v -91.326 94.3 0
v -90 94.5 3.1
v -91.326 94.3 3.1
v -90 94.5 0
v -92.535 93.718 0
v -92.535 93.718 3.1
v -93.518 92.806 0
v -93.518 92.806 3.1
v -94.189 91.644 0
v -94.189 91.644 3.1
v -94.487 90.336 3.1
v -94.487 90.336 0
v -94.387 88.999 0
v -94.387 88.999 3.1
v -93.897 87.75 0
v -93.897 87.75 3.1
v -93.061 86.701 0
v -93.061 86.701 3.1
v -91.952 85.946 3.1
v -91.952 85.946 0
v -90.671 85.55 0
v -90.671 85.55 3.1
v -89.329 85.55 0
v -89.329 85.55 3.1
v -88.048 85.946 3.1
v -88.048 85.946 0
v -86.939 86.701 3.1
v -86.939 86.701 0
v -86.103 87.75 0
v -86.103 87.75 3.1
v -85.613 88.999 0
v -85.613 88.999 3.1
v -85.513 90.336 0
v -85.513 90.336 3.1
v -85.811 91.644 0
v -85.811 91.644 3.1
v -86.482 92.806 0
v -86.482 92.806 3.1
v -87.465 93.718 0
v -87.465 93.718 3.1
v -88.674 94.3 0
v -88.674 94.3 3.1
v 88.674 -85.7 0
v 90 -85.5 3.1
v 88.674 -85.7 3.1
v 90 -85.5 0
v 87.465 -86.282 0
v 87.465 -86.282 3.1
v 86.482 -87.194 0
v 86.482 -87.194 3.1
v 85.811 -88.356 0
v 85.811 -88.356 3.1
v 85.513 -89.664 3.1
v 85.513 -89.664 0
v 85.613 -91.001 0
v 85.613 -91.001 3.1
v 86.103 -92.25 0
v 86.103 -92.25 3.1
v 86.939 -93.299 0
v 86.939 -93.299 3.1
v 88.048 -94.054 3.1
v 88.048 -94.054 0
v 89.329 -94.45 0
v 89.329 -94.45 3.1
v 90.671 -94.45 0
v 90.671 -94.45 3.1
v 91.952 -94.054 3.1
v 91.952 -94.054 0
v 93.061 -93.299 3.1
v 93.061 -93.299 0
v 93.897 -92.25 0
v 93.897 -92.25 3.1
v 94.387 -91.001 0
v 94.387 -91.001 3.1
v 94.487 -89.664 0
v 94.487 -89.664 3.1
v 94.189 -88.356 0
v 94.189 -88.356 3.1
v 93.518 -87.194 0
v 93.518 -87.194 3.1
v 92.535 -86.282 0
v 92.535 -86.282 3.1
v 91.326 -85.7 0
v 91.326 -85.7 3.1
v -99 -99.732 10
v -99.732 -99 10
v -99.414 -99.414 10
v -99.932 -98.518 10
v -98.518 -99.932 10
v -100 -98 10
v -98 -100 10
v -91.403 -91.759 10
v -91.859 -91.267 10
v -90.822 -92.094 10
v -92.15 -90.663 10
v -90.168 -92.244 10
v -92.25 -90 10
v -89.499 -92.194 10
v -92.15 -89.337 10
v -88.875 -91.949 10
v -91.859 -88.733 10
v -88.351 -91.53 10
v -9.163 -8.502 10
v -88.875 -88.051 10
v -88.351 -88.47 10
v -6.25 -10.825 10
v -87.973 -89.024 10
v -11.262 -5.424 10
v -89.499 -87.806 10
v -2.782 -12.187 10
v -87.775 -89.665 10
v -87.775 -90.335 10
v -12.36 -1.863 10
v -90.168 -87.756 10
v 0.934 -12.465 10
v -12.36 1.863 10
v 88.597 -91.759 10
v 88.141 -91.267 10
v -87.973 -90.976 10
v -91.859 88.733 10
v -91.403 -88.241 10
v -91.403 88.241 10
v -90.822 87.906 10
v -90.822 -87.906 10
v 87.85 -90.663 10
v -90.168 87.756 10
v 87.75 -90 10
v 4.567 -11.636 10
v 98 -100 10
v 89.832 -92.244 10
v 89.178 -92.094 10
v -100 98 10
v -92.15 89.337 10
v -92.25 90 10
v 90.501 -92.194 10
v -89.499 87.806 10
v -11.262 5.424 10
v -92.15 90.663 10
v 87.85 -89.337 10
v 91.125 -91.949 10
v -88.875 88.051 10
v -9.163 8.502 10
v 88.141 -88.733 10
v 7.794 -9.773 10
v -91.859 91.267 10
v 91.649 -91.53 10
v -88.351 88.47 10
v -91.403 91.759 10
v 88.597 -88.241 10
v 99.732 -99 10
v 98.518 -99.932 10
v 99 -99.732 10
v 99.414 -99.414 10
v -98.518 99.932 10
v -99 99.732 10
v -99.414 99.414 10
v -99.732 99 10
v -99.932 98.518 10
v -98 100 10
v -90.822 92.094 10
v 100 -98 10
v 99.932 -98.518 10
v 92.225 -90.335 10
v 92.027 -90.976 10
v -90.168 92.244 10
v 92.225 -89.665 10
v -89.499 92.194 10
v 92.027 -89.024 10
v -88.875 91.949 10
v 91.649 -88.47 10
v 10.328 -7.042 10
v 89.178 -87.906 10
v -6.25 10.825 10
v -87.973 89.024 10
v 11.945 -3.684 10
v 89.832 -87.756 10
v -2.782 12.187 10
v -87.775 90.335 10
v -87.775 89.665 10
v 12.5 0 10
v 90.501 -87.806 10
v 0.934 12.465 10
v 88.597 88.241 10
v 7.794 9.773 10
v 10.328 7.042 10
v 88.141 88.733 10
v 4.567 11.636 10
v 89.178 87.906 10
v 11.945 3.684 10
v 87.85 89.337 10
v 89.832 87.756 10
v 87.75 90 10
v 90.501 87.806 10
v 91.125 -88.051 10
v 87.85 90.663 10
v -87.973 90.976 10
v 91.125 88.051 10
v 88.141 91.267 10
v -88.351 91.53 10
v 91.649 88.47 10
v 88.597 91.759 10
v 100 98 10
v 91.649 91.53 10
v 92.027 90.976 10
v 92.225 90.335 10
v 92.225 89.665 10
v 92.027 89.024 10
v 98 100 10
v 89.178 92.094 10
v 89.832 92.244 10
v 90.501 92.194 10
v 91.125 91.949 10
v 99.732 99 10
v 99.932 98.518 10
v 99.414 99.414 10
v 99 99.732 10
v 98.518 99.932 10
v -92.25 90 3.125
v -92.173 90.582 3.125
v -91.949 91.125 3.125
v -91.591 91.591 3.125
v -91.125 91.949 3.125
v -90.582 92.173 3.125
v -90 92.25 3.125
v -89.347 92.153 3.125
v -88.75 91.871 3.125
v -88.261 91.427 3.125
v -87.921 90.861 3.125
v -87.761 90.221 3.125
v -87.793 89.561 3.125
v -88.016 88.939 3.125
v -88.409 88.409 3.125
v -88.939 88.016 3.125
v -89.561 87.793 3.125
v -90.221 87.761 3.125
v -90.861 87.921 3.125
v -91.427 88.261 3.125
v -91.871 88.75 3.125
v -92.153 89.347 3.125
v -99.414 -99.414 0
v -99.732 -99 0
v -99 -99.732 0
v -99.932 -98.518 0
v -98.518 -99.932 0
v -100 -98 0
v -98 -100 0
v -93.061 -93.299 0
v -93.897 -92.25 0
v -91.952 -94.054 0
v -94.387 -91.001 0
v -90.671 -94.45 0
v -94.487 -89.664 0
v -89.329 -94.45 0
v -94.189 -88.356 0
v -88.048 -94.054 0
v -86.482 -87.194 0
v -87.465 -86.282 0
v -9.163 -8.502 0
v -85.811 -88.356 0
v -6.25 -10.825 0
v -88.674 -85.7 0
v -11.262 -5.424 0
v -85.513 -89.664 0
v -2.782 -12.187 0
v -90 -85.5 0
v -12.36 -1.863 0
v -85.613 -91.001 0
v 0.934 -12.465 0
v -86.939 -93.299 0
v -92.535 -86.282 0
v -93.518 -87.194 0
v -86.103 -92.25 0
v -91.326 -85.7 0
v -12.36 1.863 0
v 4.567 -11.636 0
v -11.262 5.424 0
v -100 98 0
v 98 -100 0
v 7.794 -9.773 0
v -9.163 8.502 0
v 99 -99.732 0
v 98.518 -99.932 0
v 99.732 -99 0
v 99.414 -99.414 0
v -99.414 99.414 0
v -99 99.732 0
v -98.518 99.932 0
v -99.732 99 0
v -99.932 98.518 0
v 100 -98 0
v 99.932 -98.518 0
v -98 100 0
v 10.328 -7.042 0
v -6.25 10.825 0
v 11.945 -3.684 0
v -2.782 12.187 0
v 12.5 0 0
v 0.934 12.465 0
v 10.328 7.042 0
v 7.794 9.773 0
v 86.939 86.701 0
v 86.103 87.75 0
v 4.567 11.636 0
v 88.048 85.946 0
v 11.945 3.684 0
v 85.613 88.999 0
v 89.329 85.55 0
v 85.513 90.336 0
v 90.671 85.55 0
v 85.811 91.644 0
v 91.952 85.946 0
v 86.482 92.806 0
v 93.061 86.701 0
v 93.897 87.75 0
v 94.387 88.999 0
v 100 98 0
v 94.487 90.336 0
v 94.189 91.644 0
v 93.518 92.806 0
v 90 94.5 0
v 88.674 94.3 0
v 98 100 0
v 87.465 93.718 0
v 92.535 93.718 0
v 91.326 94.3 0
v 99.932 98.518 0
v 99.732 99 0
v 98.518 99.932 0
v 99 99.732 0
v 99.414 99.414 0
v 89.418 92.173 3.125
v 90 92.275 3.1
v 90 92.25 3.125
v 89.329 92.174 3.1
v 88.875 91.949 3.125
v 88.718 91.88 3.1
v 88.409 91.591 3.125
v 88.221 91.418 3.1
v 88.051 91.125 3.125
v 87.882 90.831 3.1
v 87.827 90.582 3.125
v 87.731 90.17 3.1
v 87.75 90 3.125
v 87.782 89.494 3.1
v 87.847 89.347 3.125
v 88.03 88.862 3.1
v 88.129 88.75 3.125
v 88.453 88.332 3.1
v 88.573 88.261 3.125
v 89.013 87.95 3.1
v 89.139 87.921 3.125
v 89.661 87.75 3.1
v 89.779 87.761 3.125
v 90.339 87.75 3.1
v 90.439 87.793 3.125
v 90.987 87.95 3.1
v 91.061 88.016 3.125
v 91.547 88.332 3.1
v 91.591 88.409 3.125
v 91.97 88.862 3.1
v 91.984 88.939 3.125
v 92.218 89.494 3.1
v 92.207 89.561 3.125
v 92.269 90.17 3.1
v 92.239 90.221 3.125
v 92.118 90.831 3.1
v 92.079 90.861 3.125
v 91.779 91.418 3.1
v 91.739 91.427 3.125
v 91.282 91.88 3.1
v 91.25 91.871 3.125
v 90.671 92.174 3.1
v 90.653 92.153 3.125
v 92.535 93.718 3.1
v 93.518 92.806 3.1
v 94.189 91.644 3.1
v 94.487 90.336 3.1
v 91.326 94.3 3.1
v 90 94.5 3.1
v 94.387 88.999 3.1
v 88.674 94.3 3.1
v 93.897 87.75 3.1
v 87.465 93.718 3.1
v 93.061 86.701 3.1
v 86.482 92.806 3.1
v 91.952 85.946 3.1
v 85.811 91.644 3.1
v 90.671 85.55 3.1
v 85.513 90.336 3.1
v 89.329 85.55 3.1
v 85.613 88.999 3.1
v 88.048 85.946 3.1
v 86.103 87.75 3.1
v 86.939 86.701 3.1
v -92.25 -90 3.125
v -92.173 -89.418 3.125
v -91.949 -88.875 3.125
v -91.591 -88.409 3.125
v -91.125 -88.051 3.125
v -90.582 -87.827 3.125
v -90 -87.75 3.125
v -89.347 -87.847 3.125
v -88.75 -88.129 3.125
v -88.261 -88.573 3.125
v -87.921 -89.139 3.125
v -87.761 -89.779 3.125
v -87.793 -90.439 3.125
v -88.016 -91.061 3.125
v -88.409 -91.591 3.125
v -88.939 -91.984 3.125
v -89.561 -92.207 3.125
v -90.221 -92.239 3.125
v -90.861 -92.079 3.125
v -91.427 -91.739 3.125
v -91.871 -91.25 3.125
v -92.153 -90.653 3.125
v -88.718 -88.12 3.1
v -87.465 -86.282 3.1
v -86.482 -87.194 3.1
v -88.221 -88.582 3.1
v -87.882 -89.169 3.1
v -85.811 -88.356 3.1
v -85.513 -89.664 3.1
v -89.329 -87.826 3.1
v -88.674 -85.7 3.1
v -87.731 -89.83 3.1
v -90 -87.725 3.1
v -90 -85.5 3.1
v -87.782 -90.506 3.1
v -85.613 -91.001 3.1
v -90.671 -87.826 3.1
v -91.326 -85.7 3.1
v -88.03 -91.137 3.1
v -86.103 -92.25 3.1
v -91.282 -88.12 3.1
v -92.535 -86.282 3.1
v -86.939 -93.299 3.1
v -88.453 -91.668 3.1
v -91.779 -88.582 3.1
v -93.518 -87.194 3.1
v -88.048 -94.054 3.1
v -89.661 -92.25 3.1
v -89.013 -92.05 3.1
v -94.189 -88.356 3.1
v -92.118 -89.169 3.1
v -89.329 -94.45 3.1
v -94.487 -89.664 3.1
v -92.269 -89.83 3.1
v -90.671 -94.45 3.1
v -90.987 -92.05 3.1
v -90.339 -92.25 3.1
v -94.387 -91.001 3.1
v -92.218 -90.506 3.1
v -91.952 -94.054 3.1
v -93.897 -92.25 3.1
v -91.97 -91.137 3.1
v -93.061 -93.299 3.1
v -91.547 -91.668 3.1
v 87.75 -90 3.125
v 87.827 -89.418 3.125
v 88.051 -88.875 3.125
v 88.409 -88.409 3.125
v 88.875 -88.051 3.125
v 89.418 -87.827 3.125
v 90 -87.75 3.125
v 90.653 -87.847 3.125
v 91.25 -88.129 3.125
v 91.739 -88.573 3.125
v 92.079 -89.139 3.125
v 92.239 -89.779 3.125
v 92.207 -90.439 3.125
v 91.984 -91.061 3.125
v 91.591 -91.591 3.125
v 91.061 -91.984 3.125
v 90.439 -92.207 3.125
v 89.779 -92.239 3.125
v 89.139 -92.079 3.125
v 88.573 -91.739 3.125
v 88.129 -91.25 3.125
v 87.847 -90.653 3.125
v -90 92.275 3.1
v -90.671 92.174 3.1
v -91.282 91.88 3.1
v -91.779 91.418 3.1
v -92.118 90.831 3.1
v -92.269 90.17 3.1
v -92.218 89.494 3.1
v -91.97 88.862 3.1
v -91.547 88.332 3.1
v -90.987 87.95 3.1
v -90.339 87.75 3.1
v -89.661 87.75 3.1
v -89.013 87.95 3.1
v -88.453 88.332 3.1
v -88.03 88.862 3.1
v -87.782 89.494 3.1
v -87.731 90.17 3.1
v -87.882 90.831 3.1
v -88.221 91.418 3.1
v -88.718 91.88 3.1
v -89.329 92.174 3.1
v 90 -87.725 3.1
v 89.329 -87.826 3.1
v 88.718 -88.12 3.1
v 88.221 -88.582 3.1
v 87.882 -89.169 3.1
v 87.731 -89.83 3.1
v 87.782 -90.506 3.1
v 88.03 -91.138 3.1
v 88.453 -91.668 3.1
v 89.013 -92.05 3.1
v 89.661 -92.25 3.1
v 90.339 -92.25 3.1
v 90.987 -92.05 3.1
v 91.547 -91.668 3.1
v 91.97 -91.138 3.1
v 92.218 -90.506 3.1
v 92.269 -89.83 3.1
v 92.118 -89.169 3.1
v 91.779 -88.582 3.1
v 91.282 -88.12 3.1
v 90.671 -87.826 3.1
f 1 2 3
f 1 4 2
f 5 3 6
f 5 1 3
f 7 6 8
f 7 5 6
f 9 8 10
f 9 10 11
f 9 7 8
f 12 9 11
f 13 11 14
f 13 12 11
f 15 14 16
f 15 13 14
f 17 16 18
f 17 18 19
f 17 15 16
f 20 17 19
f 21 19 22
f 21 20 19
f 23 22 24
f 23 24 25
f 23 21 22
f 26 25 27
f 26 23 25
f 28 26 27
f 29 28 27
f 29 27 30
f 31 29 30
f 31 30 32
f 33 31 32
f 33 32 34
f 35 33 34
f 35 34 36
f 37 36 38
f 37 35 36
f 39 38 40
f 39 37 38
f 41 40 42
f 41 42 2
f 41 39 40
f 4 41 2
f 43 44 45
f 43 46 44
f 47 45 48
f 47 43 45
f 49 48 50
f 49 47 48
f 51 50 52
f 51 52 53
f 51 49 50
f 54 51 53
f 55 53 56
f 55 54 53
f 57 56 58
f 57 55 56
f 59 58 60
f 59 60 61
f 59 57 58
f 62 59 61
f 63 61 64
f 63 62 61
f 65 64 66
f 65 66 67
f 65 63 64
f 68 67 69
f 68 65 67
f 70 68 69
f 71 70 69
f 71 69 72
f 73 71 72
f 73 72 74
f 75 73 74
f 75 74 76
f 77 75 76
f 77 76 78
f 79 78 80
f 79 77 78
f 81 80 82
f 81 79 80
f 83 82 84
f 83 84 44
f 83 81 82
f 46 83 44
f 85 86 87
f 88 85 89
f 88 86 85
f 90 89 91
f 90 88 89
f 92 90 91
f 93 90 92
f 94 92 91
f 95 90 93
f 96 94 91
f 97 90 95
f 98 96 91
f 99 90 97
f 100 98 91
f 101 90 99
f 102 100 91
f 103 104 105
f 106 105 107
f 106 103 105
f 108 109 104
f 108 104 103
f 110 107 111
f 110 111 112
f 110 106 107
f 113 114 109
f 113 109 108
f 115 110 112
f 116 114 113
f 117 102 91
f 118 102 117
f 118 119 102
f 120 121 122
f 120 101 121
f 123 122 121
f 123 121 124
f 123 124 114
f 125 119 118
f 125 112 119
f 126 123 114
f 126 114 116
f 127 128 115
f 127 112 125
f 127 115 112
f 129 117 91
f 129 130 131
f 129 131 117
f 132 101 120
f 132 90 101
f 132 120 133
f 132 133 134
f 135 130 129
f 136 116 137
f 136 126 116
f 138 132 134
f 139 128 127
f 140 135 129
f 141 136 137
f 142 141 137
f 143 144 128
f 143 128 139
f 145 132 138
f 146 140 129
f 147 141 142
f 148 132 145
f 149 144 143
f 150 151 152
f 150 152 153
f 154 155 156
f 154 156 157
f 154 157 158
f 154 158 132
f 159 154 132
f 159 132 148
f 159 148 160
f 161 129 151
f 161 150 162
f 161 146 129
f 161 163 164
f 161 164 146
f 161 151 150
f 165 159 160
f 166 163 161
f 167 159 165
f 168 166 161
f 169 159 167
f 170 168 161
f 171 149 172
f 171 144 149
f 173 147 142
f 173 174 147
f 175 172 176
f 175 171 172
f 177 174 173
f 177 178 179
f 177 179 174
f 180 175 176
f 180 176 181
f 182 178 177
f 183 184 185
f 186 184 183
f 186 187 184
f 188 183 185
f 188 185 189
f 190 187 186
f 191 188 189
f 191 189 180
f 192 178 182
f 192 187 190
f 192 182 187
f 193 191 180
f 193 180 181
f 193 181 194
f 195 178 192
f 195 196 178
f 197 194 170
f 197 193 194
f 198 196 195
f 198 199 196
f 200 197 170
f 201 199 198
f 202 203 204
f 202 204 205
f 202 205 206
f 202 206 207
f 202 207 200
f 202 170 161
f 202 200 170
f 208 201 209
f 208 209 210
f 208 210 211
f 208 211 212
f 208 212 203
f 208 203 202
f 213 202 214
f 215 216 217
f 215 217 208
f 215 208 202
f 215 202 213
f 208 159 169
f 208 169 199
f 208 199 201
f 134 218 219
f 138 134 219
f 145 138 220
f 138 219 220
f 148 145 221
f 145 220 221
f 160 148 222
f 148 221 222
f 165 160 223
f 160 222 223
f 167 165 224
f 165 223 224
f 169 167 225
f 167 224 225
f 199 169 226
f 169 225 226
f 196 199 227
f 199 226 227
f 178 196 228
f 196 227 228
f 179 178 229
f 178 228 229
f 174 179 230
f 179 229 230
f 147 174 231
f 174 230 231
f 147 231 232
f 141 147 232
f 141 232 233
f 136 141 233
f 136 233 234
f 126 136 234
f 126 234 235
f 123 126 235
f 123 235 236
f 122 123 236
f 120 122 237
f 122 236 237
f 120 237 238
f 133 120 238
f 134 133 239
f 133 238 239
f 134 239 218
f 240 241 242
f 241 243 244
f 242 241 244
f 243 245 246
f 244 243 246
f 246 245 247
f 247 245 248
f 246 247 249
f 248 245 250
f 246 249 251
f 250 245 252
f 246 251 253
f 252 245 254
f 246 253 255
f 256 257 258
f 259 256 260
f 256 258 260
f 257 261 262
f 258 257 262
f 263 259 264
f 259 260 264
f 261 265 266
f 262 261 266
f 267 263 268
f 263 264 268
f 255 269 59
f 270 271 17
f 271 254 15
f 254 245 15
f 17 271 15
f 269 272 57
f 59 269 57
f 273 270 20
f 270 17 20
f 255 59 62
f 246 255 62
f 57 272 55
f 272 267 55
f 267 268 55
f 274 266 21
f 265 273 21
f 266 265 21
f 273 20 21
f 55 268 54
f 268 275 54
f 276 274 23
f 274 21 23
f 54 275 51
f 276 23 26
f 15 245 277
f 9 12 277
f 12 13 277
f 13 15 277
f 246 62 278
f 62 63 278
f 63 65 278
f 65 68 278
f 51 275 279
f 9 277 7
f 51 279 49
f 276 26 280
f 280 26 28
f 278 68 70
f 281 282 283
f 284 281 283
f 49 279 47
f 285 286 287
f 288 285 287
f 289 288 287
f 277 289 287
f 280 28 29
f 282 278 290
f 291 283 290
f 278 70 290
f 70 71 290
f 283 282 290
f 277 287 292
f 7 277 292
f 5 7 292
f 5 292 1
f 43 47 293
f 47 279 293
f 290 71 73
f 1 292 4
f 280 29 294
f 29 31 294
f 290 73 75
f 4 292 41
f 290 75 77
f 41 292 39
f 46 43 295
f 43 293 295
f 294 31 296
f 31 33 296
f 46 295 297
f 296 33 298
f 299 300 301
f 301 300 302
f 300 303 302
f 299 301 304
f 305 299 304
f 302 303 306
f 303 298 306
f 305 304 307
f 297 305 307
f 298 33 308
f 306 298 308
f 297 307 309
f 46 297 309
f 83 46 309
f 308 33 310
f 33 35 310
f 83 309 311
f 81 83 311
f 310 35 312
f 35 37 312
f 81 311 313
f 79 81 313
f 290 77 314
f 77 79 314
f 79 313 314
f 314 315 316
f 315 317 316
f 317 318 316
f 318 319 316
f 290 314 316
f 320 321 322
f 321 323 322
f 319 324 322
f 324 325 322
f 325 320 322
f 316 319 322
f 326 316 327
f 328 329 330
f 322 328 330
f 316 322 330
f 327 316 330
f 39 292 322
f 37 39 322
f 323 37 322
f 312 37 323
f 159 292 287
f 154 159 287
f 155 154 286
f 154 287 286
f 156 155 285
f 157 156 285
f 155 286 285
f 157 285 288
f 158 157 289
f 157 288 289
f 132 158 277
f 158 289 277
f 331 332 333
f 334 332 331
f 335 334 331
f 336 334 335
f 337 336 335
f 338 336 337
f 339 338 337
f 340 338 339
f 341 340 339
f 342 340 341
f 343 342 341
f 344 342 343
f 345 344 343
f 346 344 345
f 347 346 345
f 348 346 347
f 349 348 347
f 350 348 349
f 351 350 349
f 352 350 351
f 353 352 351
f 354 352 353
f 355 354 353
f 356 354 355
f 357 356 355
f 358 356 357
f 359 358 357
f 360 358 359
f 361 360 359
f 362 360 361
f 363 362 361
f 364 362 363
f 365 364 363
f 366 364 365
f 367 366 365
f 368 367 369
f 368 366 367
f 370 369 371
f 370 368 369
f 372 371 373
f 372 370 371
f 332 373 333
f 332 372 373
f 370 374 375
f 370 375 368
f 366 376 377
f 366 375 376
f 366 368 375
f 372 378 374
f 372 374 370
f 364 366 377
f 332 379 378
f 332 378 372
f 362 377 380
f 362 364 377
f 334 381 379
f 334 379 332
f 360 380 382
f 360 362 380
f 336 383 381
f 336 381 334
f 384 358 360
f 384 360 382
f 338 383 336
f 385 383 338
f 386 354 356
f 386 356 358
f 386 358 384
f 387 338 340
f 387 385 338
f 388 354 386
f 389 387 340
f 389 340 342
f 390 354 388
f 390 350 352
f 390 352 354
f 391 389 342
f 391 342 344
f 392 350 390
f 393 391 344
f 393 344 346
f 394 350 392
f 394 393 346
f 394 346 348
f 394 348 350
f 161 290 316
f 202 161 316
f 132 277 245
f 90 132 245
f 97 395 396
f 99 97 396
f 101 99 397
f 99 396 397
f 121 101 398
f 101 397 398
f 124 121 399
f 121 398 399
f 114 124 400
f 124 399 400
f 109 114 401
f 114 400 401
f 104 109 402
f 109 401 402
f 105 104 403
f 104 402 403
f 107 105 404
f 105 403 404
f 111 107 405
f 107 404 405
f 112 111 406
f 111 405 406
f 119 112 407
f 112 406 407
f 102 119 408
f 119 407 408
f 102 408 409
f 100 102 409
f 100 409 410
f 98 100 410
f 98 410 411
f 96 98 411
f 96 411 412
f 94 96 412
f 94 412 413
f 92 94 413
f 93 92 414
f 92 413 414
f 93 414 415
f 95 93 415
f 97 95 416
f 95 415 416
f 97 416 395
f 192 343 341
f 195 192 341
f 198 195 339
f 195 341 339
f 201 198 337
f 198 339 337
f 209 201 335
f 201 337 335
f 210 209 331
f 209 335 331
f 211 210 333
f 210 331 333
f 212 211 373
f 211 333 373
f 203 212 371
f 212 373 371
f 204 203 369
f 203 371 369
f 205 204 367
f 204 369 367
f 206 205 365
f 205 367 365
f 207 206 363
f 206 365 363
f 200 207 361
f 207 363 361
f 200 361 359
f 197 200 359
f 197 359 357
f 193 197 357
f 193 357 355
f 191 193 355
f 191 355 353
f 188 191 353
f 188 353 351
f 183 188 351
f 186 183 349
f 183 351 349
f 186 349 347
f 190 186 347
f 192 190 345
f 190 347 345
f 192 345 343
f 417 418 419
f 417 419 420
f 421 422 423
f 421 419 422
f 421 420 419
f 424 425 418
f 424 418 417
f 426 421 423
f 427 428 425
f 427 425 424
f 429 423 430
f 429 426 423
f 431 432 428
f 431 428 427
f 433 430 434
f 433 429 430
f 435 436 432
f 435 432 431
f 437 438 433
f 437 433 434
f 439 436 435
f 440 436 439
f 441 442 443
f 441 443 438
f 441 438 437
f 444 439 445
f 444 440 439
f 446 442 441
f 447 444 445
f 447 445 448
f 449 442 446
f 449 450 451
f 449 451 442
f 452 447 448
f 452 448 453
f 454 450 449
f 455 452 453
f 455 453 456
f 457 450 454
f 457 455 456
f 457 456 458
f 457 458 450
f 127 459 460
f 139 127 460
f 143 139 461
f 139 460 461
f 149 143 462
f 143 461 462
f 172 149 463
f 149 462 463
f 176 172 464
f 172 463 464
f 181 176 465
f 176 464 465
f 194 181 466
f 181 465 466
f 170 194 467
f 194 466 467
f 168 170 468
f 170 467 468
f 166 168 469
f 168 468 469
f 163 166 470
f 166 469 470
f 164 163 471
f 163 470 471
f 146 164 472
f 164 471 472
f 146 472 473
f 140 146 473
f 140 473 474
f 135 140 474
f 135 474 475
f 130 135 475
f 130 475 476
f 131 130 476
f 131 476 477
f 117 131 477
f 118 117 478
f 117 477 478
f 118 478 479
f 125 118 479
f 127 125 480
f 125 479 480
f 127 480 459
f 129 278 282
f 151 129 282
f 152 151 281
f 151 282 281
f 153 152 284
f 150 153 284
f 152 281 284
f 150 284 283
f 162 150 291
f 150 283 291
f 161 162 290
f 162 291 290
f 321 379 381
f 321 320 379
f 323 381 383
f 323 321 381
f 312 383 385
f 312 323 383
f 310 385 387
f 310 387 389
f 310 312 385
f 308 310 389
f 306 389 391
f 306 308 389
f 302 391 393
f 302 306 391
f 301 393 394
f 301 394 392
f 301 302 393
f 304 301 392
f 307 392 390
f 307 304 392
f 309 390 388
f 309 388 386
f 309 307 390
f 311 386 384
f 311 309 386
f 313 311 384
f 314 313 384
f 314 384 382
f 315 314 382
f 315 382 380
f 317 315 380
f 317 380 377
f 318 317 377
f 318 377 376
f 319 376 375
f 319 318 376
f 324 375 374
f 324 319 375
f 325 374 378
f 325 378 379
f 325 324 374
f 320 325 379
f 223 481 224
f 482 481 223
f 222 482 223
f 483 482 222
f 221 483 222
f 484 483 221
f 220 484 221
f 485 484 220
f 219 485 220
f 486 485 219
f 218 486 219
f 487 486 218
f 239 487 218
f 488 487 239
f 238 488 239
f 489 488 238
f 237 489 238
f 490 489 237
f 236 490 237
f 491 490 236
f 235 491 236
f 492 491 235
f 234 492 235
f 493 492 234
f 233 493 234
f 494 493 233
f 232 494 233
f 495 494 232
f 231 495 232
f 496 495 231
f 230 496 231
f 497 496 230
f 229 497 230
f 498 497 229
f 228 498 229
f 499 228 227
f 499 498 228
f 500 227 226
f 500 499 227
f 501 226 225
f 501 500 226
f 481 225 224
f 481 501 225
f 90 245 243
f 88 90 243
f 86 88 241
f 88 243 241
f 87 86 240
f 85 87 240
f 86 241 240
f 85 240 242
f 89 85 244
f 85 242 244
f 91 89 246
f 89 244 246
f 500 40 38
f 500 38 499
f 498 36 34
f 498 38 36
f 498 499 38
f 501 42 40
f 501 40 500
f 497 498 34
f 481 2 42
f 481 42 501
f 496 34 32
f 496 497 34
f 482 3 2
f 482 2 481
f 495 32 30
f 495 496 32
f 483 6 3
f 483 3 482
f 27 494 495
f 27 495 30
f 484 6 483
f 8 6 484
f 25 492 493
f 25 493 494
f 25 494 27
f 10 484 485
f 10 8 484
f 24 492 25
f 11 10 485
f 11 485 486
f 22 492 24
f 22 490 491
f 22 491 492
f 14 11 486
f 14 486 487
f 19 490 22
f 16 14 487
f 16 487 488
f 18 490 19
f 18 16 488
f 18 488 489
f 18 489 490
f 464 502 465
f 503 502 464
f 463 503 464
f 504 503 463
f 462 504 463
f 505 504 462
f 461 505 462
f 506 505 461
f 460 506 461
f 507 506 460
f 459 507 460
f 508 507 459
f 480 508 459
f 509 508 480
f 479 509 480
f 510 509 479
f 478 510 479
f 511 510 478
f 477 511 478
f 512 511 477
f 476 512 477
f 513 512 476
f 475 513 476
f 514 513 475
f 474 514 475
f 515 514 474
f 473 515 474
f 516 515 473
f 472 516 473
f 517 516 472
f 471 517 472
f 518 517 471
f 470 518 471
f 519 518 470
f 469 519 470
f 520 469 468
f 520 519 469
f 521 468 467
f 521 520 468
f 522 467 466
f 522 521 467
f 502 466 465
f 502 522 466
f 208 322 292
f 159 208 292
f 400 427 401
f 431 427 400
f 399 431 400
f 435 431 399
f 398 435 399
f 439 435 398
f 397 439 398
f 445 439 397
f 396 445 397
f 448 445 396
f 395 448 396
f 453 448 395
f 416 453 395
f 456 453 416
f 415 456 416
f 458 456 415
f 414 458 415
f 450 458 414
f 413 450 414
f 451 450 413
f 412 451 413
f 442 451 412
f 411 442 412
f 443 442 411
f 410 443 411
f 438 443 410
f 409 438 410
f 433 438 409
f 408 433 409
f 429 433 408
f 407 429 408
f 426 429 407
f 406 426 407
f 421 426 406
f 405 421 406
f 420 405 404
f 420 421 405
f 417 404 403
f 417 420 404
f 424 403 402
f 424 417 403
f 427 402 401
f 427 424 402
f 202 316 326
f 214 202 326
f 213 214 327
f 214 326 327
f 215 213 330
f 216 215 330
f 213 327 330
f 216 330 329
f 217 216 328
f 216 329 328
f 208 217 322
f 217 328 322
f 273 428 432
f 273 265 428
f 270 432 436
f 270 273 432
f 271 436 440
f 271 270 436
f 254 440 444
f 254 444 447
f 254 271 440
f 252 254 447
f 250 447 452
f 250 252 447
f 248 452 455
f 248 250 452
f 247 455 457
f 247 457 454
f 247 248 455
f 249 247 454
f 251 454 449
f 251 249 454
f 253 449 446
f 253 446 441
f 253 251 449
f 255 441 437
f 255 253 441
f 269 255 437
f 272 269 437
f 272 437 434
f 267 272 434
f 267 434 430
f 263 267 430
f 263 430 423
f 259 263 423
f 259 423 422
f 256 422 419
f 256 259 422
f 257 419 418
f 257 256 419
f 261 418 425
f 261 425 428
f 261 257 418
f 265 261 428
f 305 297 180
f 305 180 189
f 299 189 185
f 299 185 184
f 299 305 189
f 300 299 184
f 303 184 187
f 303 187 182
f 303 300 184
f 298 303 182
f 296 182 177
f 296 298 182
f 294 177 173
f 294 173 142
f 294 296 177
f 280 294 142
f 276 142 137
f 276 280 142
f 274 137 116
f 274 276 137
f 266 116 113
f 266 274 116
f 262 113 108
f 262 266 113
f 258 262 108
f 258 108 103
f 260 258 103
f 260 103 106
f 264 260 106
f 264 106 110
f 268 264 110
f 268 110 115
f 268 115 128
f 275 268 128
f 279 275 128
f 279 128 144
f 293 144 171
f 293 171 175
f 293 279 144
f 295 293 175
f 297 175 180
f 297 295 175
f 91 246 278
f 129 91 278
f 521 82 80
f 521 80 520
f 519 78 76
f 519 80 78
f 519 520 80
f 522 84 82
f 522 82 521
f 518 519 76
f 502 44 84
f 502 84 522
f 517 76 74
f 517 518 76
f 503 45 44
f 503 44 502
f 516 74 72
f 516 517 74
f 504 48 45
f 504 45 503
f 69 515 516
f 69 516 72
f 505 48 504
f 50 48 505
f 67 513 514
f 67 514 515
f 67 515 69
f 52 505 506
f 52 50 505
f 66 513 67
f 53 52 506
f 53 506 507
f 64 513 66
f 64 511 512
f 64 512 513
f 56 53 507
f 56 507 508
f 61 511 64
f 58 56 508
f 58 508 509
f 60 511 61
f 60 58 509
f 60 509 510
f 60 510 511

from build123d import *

# Parameters (mm, degrees)
ESQUISSE1_R                                = 12.5
BOSS_EXTRU_1_DEPTH                         = 10
D_GAGEMENT_M41_D                           = 4.5
CHAMBRAGE_POUR_VIS_T_TE_RONDE_BOMB_2_COUNT = 2
CHAMBRAGE_POUR_VIS_T_TE_RONDE_BOMB_2_PITCH = 180
CHAMBRAGE_POUR_VIS_T_TE_RONDE_BOMB_3_COUNT = 2
CHAMBRAGE_POUR_VIS_T_TE_RONDE_BOMB_3_PITCH = 254.558441227
CHAMBRAGE_POUR_VIS_T_TE_RONDE_BOMB_4_COUNT = 2
CHAMBRAGE_POUR_VIS_T_TE_RONDE_BOMB_4_PITCH = 180


with BuildPart() as part:
    # Esquisse1 → Boss.-Extru.1 (new body)
    with BuildSketch(Plane.XY):
        with BuildLine():
            Line((-98, -100), (98, -100))
            ThreePointArc((98, -100), (99.414213562, -99.414213562), (100, -98))
            Line((100, -98), (100, 98))
            ThreePointArc((100, 98), (99.414213562, 99.414213562), (98, 100))
            Line((98, 100), (-98, 100))
            ThreePointArc((-98, 100), (-99.414213562, 99.414213562), (-100, 98))
            Line((-100, 98), (-100, -98))
            ThreePointArc((-100, -98), (-99.414213562, -99.414213562), (-98, -100))
        make_face()
        Circle(ESQUISSE1_R, mode=Mode.SUBTRACT)
    extrude(amount=BOSS_EXTRU_1_DEPTH)

    # Dégagement M41 (through all)
    with Locations(Plane.XY.offset(10)):
        with Locations((-90, 90), (-90, -90), (90, -90), (90, 90)):
            Hole(D_GAGEMENT_M41_D / 2)

    # Esquisse6 → Chambrage pour vis à tête ronde bombée M41 (revolve, cut)
    with BuildSketch(Plane(origin=(90, 90, 0), x_dir=(0, 1, 0), z_dir=(1, 0, 0))):
        Polygon((0, 0), (0, 10), (2.25, 10), (2.25, 3.125), (2.275, 3.1), (4.5, 3.1), (4.5, 0), align=None)
    chambrage_pour_vis_t_te_ronde_bomb_e_m = revolve(axis=Axis((90, 90, -6.35), (0, 0, 1)), mode=Mode.SUBTRACT)

    # Chambrage pour vis _ t_te ronde bomb 2: Chambrage pour vis à tête ronde bombée M41 ×2
    with Locations(*[(-i * CHAMBRAGE_POUR_VIS_T_TE_RONDE_BOMB_2_PITCH, 0, 0) for i in range(1, CHAMBRAGE_POUR_VIS_T_TE_RONDE_BOMB_2_COUNT)]):
        add(chambrage_pour_vis_t_te_ronde_bomb_e_m, mode=Mode.SUBTRACT)

    # Chambrage pour vis _ t_te ronde bomb 3: Chambrage pour vis à tête ronde bombée M41 ×2
    with Locations(*[Vector(-0.7071067811865476, -0.7071067811865476, 0) * (i * CHAMBRAGE_POUR_VIS_T_TE_RONDE_BOMB_3_PITCH) for i in range(1, CHAMBRAGE_POUR_VIS_T_TE_RONDE_BOMB_3_COUNT)]):
        add(chambrage_pour_vis_t_te_ronde_bomb_e_m, mode=Mode.SUBTRACT)

    # Chambrage pour vis _ t_te ronde bomb 4: Chambrage pour vis à tête ronde bombée M41 ×2
    with Locations(*[(0, -i * CHAMBRAGE_POUR_VIS_T_TE_RONDE_BOMB_4_PITCH, 0) for i in range(1, CHAMBRAGE_POUR_VIS_T_TE_RONDE_BOMB_4_COUNT)]):
        add(chambrage_pour_vis_t_te_ronde_bomb_e_m, mode=Mode.SUBTRACT)


solid = part.part
